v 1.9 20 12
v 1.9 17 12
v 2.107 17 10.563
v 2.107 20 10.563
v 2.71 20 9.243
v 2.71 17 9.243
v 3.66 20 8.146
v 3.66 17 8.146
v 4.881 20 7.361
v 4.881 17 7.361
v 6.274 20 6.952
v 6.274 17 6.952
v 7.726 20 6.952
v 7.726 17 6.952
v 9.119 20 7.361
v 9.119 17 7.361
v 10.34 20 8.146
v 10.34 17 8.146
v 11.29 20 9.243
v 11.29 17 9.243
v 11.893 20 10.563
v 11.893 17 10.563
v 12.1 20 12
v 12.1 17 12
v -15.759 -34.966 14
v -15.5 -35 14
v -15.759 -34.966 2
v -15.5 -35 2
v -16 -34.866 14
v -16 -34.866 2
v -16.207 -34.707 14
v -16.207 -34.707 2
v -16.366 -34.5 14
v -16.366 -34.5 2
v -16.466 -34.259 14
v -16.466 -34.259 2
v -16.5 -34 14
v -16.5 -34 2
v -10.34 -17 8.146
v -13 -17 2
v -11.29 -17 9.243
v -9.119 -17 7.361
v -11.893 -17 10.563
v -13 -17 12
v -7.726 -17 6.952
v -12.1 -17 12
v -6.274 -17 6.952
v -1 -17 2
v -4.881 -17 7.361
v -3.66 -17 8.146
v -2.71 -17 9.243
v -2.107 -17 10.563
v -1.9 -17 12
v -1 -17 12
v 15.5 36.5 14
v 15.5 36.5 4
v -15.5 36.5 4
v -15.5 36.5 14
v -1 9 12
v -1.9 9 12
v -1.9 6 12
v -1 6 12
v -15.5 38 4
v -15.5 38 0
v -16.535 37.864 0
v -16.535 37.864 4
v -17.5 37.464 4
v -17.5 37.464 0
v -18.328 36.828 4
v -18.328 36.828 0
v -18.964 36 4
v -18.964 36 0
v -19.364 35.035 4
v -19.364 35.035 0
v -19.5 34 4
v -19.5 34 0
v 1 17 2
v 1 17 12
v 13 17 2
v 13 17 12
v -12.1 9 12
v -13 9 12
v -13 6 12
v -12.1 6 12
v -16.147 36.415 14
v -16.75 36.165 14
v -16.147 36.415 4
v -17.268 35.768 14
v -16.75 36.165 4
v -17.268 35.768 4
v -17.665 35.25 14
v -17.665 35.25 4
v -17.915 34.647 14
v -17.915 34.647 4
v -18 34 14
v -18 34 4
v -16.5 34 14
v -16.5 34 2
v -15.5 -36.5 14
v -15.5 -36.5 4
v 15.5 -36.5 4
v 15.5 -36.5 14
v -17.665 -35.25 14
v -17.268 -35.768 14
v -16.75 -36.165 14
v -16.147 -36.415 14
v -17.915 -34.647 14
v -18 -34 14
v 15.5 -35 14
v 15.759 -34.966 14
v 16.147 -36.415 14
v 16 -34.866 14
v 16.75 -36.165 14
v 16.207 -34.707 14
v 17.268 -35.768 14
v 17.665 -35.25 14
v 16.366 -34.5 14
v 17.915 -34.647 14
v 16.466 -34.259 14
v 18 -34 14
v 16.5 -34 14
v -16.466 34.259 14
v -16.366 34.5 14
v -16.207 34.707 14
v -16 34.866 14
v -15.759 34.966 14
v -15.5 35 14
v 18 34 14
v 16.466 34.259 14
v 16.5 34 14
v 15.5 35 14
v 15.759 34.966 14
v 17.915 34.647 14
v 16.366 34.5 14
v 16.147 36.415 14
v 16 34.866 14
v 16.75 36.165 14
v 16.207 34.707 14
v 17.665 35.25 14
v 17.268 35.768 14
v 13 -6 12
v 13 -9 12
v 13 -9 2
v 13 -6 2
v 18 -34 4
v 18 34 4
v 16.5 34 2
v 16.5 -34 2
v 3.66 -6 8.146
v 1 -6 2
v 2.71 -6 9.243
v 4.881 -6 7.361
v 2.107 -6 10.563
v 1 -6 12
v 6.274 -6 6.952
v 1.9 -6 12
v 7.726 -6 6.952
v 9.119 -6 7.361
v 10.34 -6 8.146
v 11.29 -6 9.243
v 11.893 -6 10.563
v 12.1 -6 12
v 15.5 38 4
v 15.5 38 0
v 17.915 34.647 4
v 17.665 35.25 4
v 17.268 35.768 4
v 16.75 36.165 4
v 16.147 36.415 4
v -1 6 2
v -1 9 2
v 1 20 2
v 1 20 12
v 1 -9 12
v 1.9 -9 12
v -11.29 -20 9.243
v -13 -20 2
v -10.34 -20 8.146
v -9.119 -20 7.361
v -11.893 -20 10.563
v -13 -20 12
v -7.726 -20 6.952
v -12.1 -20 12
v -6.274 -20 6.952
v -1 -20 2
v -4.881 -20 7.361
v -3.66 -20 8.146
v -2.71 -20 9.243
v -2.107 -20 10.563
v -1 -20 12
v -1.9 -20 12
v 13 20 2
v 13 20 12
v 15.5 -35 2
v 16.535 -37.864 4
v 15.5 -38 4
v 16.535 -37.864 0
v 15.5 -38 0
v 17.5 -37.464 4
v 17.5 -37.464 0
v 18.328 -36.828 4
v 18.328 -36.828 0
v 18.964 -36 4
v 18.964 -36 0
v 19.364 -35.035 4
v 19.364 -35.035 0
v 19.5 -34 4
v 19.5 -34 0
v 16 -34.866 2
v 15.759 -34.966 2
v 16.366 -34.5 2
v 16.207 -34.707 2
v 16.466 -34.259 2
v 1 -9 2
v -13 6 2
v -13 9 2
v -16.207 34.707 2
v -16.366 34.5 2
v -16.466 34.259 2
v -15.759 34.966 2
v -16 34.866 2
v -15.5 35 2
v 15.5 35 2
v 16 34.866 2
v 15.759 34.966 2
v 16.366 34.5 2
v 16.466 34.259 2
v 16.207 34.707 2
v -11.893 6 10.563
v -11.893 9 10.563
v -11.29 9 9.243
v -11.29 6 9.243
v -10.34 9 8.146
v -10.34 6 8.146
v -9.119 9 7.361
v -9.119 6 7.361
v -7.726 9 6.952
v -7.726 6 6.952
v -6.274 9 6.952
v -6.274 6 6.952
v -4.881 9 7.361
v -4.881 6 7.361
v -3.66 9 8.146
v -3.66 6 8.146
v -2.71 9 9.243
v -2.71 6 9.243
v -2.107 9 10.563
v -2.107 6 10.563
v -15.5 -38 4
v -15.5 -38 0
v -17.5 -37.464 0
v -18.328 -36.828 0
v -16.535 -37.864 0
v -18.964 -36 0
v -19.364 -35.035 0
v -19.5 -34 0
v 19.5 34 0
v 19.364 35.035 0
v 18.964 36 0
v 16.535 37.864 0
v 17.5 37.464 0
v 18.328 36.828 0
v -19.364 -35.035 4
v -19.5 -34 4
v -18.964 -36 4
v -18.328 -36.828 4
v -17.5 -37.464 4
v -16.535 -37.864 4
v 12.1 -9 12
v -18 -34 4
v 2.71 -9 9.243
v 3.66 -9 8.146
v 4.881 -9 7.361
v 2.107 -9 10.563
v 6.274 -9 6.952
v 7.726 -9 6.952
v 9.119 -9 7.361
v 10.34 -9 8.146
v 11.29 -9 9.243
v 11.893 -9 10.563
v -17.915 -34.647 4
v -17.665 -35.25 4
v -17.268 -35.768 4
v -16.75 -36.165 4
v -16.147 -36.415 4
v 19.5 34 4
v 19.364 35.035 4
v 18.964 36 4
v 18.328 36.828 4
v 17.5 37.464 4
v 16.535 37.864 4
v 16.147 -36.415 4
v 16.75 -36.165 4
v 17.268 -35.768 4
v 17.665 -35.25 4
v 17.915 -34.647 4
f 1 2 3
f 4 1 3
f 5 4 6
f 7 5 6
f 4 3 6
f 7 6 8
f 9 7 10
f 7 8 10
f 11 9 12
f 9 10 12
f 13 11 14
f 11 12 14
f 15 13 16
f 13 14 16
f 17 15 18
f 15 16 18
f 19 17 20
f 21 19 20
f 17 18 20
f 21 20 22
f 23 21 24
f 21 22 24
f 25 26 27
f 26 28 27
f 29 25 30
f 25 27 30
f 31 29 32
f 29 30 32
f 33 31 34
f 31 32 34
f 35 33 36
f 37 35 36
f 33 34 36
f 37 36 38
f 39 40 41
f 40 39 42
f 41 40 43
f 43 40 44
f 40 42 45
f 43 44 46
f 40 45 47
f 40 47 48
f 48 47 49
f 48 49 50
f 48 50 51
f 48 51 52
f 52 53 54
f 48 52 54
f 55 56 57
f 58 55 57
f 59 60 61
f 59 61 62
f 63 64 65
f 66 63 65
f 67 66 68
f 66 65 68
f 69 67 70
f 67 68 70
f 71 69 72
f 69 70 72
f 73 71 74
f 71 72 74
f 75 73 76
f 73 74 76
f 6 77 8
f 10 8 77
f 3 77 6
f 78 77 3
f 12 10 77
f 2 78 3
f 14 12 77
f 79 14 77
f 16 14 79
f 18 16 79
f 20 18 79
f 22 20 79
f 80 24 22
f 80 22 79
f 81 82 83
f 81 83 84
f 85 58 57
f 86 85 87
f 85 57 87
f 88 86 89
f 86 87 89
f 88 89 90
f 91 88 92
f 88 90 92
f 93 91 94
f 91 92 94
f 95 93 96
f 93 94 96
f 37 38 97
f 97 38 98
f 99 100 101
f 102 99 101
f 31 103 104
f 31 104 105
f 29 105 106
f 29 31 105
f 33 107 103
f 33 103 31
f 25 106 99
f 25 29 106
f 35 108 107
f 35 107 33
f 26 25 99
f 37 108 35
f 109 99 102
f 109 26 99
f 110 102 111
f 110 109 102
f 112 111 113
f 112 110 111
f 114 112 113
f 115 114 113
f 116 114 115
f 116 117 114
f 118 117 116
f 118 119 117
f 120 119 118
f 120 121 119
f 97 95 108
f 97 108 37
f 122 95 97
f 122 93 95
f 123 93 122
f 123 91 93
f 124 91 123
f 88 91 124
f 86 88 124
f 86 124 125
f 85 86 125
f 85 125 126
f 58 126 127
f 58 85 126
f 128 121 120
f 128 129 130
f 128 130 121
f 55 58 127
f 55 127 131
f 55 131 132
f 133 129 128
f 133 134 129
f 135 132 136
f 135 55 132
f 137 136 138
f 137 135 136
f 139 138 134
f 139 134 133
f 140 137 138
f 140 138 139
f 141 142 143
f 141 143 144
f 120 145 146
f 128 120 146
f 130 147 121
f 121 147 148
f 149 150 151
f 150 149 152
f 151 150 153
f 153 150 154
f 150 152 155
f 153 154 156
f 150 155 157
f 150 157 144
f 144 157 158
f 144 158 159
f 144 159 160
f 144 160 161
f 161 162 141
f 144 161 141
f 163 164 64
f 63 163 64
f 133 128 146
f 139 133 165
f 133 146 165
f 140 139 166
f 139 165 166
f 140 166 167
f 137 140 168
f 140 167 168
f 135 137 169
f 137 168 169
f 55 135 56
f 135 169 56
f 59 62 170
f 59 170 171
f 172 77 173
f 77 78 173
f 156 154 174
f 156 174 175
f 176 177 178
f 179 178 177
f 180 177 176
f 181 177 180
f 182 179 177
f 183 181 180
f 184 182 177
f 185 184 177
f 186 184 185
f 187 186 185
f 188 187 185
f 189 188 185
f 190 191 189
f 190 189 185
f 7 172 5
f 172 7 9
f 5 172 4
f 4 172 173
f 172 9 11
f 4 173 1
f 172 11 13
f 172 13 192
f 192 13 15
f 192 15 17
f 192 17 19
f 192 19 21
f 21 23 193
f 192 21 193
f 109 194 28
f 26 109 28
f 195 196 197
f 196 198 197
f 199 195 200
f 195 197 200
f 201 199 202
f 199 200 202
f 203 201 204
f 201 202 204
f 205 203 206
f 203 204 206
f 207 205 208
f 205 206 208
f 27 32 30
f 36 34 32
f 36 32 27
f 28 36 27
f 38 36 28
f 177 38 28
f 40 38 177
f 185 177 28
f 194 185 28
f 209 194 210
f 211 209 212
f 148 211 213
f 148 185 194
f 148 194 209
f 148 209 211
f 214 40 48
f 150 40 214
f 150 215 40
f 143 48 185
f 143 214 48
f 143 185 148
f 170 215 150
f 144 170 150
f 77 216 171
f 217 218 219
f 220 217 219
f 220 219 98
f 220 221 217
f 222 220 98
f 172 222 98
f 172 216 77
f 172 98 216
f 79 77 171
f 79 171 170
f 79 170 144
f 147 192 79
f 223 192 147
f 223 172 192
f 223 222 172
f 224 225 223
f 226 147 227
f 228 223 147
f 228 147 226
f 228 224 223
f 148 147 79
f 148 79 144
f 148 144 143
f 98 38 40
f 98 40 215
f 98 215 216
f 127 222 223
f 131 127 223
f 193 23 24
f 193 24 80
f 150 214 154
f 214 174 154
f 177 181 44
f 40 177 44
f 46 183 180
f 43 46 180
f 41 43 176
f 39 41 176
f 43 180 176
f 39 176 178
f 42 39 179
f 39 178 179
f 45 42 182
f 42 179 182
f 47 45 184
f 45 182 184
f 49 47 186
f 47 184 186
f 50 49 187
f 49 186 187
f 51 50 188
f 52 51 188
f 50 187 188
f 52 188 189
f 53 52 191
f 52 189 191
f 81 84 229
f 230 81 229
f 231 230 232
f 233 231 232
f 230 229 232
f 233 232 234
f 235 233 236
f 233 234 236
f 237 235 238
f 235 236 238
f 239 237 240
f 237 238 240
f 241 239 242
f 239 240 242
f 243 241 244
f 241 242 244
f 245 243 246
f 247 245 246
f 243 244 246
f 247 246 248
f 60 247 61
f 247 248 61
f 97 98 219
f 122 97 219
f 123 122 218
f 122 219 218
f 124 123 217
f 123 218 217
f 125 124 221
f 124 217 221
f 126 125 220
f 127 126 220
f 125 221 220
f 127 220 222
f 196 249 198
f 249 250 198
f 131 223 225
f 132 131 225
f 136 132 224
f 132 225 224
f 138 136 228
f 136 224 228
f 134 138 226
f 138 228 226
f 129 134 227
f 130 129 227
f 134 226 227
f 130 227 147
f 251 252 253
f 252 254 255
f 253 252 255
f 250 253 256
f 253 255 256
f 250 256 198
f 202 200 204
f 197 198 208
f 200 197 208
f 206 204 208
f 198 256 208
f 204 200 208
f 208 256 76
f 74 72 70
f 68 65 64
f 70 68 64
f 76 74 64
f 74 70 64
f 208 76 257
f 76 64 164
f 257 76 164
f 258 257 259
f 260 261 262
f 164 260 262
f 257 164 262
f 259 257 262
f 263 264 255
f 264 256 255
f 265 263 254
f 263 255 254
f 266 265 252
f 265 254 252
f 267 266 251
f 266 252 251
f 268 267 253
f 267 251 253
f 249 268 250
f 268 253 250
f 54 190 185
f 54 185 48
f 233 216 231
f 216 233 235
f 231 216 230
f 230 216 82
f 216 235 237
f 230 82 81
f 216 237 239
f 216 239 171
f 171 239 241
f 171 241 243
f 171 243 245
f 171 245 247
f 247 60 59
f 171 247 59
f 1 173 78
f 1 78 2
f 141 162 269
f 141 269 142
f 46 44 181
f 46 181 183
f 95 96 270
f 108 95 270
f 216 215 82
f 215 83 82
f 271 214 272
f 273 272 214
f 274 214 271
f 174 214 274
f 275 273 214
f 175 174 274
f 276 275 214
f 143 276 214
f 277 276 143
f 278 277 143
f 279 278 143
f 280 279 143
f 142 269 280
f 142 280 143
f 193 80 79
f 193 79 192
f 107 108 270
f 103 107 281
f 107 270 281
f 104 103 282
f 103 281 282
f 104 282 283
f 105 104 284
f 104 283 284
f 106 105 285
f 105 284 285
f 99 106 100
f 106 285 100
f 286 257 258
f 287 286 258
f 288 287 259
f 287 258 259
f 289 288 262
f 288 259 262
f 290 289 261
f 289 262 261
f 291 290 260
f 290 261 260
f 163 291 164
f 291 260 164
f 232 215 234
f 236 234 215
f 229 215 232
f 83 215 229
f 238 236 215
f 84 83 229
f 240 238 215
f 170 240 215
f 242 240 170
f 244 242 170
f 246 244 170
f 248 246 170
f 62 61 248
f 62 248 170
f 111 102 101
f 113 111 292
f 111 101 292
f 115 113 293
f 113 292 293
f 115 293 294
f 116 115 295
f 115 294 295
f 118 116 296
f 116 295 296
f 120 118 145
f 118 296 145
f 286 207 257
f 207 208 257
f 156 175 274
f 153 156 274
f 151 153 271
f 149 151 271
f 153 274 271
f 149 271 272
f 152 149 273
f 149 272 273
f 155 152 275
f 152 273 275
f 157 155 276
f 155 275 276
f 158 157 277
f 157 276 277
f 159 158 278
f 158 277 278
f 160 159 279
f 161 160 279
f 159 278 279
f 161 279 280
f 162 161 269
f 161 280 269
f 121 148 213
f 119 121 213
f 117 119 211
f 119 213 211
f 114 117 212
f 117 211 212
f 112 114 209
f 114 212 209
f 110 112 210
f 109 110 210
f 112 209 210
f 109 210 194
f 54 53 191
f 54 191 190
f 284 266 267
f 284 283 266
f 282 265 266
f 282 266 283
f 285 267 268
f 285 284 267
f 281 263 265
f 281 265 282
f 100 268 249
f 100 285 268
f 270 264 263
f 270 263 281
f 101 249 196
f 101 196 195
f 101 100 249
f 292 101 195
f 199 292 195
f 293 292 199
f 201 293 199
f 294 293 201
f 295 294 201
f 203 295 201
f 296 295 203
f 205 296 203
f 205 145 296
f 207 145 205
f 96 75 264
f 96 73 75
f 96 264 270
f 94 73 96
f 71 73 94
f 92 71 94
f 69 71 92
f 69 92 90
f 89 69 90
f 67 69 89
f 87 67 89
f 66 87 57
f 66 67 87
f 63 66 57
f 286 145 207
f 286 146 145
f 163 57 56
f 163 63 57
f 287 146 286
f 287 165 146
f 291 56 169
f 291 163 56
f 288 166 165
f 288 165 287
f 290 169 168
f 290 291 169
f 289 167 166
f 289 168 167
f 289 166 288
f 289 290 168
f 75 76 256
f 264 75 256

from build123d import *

# Parameters (mm, degrees)
F1_DEPTH      = 2
F3_DEPTH      = 2
F5_W          = 12
F5_H          = 3
F6_DEPTH      = 8
F6_DEPTH_BACK = 2
F8_DEPTH      = 50
F10_DEPTH     = 50
F11_DEPTH     = 10


with BuildPart() as f1:
    # F0 (on Top) → F1 (new body)
    with BuildSketch(Plane.XY):
        with BuildLine():
            Line((-15.5, -38), (15.5, -38))
            ThreePointArc((15.5, -38), (18.3284271247, -36.8284271247), (19.5, -34))
            Line((19.5, -34), (19.5, 34))
            ThreePointArc((19.5, 34), (18.3284271247, 36.8284271247), (15.5, 38))
            Line((15.5, 38), (-15.5, 38))
            ThreePointArc((-15.5, 38), (-18.3284271247, 36.8284271247), (-19.5, 34))
            Line((-19.5, 34), (-19.5, -34))
            ThreePointArc((-19.5, -34), (-18.3284271247, -36.8284271247), (-15.5, -38))
        make_face()
    extrude(amount=F1_DEPTH)

    # F2 (on face) → F3 (join)
    with BuildSketch(Plane.XY.offset(2)):
        with BuildLine():
            Line((-19.5, 34), (-19.5, -34))
            ThreePointArc((-19.5, -34), (-18.3284271247, -36.8284271247), (-15.5, -38))
            Line((-15.5, -38), (15.5, -38))
            ThreePointArc((15.5, -38), (18.3284271247, -36.8284271247), (19.5, -34))
            Line((19.5, -34), (19.5, 34))
            ThreePointArc((19.5, 34), (18.3284271247, 36.8284271247), (15.5, 38))
            Line((15.5, 38), (-15.5, 38))
            ThreePointArc((-15.5, 38), (-18.3284271247, 36.8284271247), (-19.5, 34))
        make_face()
        with BuildLine():
            ThreePointArc((-15.5, -34.9999999106), (-16.207106718, -34.707106718), (-16.4999999106, -34))
            Line((-16.4999999106, -34), (-16.4999999106, 34))
            ThreePointArc((-16.4999999106, 34), (-16.207106718, 34.707106718), (-15.5, 34.9999999106))
            Line((-15.5, 34.9999999106), (15.5, 34.9999999106))
            ThreePointArc((15.5, 34.9999999106), (16.207106718, 34.707106718), (16.4999999106, 34))
            Line((16.4999999106, 34), (16.4999999106, -34))
            ThreePointArc((16.4999999106, -34), (16.207106718, -34.707106718), (15.5, -34.9999999106))
            Line((15.5, -34.9999999106), (-15.5, -34.9999999106))
        make_face(mode=Mode.SUBTRACT)
    extrude(amount=F3_DEPTH)

    # F5 (on face) → F6 (join, two sides)
    with BuildSketch(Plane.XY.offset(4)) as f6_sk:
        with Locations((-7, -18.4999999106)):
            Rectangle(F5_W, F5_H)
        with Locations((-7, 7.5000000894)):
            Rectangle(F5_W, F5_H)
        with Locations((7, 18.4999999106)):
            Rectangle(F5_W, F5_H)
        with Locations((7, -7.5000000894)):
            Rectangle(F5_W, F5_H)
    extrude(amount=F6_DEPTH)
    extrude(f6_sk.sketch, amount=-F6_DEPTH_BACK)

    # F7 (on face) → F8 (cut)
    with BuildSketch(Plane.XZ.offset(19.9999999106)):
        with BuildLine():
            Line((-1.9, 12), (-12.1, 12))
            ThreePointArc((-12.1, 12), (-7, 6.9), (-1.9, 12))
        make_face()
    extrude(amount=-F8_DEPTH, mode=Mode.SUBTRACT)

    # F9 (on face) → F10 (cut)
    with BuildSketch(Plane.XZ.offset(9.0000000894)):
        with BuildLine():
            Line((12.1, 12), (1.9, 12))
            ThreePointArc((1.9, 12), (7, 6.9), (12.1, 12))
        make_face()
    extrude(amount=-F10_DEPTH, mode=Mode.SUBTRACT)

    # F4 (on face) → F11 (join)
    with BuildSketch(Plane.XY.offset(4)):
        with BuildLine():
            Line((-18, 34), (-18, -34))
            ThreePointArc((-18, -34), (-17.267766953, -35.767766953), (-15.5, -36.5))
            Line((-15.5, -36.5), (15.5, -36.5))
            ThreePointArc((15.5, -36.5), (17.267766953, -35.767766953), (18, -34))
            Line((18, -34), (18, 34))
            ThreePointArc((18, 34), (17.267766953, 35.767766953), (15.5, 36.5))
            Line((15.5, 36.5), (-15.5, 36.5))
            ThreePointArc((-15.5, 36.5), (-17.267766953, 35.767766953), (-18, 34))
        make_face()
        with BuildLine():
            ThreePointArc((-15.5, -34.9999999106), (-16.207106718, -34.707106718), (-16.4999999106, -34))
            Line((-16.4999999106, -34), (-16.4999999106, 34))
            ThreePointArc((-16.4999999106, 34), (-16.207106718, 34.707106718), (-15.5, 34.9999999106))
            Line((-15.5, 34.9999999106), (15.5, 34.9999999106))
            ThreePointArc((15.5, 34.9999999106), (16.207106718, 34.707106718), (16.4999999106, 34))
            Line((16.4999999106, 34), (16.4999999106, -34))
            ThreePointArc((16.4999999106, -34), (16.207106718, -34.707106718), (15.5, -34.9999999106))
            Line((15.5, -34.9999999106), (-15.5, -34.9999999106))
        make_face(mode=Mode.SUBTRACT)
    extrude(amount=F11_DEPTH)


solid = f1.part
